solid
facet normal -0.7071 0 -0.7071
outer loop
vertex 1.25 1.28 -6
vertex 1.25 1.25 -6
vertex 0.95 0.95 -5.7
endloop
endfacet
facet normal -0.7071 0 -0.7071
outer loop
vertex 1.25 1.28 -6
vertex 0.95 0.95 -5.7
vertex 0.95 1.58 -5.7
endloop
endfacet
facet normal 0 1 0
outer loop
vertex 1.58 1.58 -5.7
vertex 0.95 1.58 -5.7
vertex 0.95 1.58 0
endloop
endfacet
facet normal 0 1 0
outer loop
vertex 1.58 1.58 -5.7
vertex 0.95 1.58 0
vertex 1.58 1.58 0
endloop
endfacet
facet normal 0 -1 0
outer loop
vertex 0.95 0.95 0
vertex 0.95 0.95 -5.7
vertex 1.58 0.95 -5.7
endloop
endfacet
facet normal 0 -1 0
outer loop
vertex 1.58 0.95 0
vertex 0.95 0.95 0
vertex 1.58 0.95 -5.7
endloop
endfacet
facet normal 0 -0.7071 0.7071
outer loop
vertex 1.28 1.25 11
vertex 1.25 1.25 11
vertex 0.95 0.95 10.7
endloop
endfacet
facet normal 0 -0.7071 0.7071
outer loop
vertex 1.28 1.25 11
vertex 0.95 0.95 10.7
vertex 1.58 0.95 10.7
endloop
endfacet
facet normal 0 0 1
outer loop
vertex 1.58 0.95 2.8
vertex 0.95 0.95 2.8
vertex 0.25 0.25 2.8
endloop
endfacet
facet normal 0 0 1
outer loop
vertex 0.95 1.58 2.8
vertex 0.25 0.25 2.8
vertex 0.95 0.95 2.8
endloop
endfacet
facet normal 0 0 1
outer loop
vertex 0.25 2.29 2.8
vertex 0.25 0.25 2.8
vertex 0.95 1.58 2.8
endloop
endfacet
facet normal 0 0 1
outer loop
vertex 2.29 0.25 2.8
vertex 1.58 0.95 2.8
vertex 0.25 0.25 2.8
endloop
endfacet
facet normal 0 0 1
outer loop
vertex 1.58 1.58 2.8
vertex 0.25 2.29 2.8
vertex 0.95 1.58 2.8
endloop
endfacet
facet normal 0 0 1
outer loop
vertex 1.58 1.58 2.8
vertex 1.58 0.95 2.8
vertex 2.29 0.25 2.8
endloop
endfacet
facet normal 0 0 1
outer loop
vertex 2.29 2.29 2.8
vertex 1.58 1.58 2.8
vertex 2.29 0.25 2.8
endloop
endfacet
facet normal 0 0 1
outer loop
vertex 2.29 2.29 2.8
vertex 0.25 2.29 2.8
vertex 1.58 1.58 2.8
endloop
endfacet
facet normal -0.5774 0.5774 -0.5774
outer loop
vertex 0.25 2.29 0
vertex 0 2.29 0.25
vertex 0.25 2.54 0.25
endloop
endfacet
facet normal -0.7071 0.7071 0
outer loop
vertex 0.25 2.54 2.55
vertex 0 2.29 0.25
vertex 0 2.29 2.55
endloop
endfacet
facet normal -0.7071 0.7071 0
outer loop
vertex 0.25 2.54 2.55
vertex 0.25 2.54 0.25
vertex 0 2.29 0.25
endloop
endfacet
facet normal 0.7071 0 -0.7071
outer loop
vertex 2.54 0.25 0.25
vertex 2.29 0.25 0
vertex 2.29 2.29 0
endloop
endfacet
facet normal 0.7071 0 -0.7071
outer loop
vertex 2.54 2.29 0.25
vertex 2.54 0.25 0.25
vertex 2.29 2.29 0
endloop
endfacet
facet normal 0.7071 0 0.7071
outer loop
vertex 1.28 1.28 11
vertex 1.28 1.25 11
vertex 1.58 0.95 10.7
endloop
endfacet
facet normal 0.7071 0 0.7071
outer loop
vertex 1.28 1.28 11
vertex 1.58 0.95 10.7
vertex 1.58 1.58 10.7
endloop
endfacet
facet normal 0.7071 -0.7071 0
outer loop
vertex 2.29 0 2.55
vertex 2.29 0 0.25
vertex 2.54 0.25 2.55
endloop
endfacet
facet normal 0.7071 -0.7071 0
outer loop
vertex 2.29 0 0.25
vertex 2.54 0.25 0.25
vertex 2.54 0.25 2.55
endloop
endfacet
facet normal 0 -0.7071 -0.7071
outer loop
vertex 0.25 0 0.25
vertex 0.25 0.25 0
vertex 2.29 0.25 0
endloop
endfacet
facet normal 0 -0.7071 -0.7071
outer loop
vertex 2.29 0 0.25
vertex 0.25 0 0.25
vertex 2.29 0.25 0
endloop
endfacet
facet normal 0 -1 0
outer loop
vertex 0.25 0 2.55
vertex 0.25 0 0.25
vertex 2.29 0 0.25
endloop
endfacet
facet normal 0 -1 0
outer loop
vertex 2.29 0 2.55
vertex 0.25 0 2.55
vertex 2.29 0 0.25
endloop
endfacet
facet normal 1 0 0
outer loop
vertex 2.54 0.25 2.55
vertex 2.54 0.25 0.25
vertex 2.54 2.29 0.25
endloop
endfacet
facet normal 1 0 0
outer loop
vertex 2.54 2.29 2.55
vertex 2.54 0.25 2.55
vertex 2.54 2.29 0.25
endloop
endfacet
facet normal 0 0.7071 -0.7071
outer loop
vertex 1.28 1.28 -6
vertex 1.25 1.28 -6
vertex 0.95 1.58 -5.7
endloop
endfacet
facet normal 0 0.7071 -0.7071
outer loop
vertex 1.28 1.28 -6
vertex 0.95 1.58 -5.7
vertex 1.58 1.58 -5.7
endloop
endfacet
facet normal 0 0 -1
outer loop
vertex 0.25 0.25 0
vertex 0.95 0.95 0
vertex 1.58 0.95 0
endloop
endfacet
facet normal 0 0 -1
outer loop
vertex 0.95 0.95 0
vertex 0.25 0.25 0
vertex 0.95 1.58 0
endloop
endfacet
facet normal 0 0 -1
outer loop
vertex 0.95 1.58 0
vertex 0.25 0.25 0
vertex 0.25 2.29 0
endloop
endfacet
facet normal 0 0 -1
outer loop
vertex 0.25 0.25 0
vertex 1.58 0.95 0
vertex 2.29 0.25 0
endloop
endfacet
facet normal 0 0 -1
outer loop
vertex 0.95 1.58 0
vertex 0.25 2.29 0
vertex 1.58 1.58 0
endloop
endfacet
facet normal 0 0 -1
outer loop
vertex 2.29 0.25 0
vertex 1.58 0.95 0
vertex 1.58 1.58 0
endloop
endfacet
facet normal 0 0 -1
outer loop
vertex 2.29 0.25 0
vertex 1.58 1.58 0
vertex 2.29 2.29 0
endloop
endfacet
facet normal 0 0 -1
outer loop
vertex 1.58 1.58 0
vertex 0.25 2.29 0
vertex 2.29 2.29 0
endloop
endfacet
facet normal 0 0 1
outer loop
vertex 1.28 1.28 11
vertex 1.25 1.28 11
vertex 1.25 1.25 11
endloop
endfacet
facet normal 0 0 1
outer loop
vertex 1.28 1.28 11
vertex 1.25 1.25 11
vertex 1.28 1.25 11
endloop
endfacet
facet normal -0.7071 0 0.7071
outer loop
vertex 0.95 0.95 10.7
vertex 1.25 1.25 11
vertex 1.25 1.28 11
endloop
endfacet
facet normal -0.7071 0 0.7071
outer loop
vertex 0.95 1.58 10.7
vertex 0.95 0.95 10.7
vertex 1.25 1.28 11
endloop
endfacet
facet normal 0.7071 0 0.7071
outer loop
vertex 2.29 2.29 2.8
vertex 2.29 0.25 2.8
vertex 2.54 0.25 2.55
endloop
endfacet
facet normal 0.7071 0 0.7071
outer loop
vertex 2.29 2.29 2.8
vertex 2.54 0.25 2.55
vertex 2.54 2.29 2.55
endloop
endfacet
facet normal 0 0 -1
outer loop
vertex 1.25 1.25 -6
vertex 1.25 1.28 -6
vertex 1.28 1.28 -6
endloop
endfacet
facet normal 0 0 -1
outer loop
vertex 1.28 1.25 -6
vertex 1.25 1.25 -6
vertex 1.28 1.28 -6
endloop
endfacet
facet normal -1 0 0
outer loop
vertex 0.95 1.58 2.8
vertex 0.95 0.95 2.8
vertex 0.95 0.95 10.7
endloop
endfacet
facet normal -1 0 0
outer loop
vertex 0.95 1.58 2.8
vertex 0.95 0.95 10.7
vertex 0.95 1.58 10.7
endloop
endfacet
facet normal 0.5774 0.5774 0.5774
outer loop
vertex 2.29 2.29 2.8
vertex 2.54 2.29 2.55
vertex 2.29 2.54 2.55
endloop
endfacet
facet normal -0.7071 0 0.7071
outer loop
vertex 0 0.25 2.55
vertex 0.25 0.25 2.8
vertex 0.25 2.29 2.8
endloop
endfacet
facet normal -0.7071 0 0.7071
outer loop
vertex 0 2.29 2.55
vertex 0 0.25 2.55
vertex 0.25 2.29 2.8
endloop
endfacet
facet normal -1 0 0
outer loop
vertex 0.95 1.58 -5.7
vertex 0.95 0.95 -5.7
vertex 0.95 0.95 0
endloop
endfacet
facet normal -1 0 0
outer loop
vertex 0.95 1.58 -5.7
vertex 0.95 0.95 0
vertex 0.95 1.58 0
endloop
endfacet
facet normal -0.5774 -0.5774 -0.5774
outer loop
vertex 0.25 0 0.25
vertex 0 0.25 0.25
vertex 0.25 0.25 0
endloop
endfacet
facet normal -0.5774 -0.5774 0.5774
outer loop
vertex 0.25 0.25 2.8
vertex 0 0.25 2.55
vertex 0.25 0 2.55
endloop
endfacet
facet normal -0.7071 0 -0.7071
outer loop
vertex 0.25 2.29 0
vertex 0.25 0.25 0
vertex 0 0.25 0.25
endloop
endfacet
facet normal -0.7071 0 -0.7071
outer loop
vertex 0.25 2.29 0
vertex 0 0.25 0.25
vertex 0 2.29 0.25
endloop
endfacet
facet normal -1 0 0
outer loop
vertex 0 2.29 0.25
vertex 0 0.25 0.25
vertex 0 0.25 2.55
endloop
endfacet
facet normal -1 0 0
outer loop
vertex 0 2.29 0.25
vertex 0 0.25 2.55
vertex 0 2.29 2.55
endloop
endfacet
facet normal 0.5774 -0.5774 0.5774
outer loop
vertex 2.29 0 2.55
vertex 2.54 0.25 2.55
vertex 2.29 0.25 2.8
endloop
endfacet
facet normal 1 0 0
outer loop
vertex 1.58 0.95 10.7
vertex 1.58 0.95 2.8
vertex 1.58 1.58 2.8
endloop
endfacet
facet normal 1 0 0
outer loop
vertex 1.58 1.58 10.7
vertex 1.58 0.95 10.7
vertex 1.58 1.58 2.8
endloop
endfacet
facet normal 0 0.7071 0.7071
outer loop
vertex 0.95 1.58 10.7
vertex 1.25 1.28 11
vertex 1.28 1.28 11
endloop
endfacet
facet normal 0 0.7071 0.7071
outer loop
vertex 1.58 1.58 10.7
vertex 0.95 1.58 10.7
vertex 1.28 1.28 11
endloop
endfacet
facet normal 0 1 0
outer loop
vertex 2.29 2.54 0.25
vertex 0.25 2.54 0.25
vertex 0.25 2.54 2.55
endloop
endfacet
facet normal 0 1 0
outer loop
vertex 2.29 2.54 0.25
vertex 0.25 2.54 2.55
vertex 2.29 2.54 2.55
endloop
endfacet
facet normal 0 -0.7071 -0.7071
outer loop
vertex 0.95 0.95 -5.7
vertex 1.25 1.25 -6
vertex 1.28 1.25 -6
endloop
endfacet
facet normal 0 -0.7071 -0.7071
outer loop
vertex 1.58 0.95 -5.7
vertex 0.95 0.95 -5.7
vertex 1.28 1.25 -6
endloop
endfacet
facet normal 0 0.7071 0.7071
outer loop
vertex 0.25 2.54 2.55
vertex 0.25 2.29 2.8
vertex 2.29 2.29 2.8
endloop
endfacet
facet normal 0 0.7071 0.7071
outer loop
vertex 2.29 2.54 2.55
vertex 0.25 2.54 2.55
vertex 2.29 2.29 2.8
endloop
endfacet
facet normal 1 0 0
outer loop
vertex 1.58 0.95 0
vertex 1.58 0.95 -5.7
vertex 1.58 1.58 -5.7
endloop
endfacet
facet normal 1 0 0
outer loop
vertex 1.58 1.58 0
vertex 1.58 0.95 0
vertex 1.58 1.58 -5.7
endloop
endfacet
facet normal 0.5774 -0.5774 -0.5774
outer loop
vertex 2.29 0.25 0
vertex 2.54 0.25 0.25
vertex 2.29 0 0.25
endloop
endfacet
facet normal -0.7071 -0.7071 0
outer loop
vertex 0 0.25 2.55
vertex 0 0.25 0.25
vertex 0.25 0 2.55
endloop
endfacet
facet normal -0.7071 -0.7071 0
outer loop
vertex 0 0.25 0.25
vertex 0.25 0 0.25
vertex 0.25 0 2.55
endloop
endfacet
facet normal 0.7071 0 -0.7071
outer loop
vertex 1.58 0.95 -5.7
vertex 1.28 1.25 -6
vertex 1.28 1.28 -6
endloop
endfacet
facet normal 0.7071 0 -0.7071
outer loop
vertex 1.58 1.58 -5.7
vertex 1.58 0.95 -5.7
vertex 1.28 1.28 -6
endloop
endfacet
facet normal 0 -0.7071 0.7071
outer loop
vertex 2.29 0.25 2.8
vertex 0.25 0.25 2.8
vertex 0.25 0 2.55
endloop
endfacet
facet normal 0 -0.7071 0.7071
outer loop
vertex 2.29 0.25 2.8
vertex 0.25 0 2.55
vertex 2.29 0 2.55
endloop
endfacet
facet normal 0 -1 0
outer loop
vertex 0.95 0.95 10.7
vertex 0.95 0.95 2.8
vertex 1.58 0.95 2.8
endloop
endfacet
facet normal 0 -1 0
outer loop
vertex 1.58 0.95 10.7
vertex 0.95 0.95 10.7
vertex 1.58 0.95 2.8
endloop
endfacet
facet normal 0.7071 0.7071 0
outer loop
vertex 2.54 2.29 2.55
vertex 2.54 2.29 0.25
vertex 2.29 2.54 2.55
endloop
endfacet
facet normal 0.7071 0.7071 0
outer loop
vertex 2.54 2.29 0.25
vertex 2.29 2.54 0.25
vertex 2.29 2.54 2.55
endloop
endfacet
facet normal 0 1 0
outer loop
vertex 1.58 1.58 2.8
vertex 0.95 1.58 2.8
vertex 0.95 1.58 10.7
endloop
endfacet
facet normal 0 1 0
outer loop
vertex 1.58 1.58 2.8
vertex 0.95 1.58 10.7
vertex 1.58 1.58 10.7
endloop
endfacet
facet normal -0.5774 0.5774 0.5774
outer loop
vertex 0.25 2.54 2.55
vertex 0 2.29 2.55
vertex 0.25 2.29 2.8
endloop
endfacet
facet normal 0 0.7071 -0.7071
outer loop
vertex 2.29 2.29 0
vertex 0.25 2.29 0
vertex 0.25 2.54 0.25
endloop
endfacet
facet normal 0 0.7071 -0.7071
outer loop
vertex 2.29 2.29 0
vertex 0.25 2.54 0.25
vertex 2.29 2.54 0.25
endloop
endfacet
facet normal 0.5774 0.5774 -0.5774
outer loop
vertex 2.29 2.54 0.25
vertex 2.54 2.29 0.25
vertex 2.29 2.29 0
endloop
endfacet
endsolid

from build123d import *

# Parameters (mm, degrees)
BOX001_W        = 0.63
BOX001_H        = 0.63
BOX001_DEPTH    = 17
CHAMFER001_SIZE = 0.3
BOX_W           = 2.54
BOX_H           = 2.54
BOX_DEPTH       = 2.8
CHAMFER_SIZE    = 0.25


with BuildPart() as pin:
    # Box001 → Box001 (new body)
    with BuildSketch(Plane(origin=(-3, 0, 0), x_dir=(1, 0, 0), z_dir=(0, 0, 1))):
        with Locations((0.315, 0.315)):
            Rectangle(BOX001_W, BOX001_H)
    extrude(amount=BOX001_DEPTH)

    # Chamfer001
    chamfer001_edges = [pin.edges().sort_by_distance(p)[0] for p in [
        (-3, 0.315, 17),
        (-3, 0.315, 0),
        (-2.37, 0.315, 17),
        (-2.37, 0.315, 0),
        (-2.685, 0, 0),
        (-2.685, 0, 17),
        (-2.685, 0.63, 0),
        (-2.685, 0.63, 17),
    ]]
    chamfer(chamfer001_edges, length=CHAMFER001_SIZE)


with BuildPart() as pin_1:
    # Chamfer001 placement: moved
    add(pin.part.moved(Location((3.95, 0.95, -6))))


with BuildPart() as single_pin:
    # Box → Box (new body)
    with BuildSketch(Plane.XY):
        with Locations((1.27, 1.27)):
            Rectangle(BOX_W, BOX_H)
    extrude(amount=BOX_DEPTH)

    # Chamfer
    chamfer_edges = [single_pin.edges().sort_by_distance(p)[0] for p in [
        (0, 0, 1.4),
        (0, 1.27, 2.8),
        (0, 2.54, 1.4),
        (0, 1.27, 0),
        (2.54, 0, 1.4),
        (2.54, 1.27, 2.8),
        (2.54, 2.54, 1.4),
        (2.54, 1.27, 0),
        (1.27, 0, 0),
        (1.27, 0, 2.8),
        (1.27, 2.54, 0),
        (1.27, 2.54, 2.8),
    ]]
    chamfer(chamfer_edges, length=CHAMFER_SIZE)

    # Fusion: union Pin
    add(pin_1.part)


solid = single_pin.part
